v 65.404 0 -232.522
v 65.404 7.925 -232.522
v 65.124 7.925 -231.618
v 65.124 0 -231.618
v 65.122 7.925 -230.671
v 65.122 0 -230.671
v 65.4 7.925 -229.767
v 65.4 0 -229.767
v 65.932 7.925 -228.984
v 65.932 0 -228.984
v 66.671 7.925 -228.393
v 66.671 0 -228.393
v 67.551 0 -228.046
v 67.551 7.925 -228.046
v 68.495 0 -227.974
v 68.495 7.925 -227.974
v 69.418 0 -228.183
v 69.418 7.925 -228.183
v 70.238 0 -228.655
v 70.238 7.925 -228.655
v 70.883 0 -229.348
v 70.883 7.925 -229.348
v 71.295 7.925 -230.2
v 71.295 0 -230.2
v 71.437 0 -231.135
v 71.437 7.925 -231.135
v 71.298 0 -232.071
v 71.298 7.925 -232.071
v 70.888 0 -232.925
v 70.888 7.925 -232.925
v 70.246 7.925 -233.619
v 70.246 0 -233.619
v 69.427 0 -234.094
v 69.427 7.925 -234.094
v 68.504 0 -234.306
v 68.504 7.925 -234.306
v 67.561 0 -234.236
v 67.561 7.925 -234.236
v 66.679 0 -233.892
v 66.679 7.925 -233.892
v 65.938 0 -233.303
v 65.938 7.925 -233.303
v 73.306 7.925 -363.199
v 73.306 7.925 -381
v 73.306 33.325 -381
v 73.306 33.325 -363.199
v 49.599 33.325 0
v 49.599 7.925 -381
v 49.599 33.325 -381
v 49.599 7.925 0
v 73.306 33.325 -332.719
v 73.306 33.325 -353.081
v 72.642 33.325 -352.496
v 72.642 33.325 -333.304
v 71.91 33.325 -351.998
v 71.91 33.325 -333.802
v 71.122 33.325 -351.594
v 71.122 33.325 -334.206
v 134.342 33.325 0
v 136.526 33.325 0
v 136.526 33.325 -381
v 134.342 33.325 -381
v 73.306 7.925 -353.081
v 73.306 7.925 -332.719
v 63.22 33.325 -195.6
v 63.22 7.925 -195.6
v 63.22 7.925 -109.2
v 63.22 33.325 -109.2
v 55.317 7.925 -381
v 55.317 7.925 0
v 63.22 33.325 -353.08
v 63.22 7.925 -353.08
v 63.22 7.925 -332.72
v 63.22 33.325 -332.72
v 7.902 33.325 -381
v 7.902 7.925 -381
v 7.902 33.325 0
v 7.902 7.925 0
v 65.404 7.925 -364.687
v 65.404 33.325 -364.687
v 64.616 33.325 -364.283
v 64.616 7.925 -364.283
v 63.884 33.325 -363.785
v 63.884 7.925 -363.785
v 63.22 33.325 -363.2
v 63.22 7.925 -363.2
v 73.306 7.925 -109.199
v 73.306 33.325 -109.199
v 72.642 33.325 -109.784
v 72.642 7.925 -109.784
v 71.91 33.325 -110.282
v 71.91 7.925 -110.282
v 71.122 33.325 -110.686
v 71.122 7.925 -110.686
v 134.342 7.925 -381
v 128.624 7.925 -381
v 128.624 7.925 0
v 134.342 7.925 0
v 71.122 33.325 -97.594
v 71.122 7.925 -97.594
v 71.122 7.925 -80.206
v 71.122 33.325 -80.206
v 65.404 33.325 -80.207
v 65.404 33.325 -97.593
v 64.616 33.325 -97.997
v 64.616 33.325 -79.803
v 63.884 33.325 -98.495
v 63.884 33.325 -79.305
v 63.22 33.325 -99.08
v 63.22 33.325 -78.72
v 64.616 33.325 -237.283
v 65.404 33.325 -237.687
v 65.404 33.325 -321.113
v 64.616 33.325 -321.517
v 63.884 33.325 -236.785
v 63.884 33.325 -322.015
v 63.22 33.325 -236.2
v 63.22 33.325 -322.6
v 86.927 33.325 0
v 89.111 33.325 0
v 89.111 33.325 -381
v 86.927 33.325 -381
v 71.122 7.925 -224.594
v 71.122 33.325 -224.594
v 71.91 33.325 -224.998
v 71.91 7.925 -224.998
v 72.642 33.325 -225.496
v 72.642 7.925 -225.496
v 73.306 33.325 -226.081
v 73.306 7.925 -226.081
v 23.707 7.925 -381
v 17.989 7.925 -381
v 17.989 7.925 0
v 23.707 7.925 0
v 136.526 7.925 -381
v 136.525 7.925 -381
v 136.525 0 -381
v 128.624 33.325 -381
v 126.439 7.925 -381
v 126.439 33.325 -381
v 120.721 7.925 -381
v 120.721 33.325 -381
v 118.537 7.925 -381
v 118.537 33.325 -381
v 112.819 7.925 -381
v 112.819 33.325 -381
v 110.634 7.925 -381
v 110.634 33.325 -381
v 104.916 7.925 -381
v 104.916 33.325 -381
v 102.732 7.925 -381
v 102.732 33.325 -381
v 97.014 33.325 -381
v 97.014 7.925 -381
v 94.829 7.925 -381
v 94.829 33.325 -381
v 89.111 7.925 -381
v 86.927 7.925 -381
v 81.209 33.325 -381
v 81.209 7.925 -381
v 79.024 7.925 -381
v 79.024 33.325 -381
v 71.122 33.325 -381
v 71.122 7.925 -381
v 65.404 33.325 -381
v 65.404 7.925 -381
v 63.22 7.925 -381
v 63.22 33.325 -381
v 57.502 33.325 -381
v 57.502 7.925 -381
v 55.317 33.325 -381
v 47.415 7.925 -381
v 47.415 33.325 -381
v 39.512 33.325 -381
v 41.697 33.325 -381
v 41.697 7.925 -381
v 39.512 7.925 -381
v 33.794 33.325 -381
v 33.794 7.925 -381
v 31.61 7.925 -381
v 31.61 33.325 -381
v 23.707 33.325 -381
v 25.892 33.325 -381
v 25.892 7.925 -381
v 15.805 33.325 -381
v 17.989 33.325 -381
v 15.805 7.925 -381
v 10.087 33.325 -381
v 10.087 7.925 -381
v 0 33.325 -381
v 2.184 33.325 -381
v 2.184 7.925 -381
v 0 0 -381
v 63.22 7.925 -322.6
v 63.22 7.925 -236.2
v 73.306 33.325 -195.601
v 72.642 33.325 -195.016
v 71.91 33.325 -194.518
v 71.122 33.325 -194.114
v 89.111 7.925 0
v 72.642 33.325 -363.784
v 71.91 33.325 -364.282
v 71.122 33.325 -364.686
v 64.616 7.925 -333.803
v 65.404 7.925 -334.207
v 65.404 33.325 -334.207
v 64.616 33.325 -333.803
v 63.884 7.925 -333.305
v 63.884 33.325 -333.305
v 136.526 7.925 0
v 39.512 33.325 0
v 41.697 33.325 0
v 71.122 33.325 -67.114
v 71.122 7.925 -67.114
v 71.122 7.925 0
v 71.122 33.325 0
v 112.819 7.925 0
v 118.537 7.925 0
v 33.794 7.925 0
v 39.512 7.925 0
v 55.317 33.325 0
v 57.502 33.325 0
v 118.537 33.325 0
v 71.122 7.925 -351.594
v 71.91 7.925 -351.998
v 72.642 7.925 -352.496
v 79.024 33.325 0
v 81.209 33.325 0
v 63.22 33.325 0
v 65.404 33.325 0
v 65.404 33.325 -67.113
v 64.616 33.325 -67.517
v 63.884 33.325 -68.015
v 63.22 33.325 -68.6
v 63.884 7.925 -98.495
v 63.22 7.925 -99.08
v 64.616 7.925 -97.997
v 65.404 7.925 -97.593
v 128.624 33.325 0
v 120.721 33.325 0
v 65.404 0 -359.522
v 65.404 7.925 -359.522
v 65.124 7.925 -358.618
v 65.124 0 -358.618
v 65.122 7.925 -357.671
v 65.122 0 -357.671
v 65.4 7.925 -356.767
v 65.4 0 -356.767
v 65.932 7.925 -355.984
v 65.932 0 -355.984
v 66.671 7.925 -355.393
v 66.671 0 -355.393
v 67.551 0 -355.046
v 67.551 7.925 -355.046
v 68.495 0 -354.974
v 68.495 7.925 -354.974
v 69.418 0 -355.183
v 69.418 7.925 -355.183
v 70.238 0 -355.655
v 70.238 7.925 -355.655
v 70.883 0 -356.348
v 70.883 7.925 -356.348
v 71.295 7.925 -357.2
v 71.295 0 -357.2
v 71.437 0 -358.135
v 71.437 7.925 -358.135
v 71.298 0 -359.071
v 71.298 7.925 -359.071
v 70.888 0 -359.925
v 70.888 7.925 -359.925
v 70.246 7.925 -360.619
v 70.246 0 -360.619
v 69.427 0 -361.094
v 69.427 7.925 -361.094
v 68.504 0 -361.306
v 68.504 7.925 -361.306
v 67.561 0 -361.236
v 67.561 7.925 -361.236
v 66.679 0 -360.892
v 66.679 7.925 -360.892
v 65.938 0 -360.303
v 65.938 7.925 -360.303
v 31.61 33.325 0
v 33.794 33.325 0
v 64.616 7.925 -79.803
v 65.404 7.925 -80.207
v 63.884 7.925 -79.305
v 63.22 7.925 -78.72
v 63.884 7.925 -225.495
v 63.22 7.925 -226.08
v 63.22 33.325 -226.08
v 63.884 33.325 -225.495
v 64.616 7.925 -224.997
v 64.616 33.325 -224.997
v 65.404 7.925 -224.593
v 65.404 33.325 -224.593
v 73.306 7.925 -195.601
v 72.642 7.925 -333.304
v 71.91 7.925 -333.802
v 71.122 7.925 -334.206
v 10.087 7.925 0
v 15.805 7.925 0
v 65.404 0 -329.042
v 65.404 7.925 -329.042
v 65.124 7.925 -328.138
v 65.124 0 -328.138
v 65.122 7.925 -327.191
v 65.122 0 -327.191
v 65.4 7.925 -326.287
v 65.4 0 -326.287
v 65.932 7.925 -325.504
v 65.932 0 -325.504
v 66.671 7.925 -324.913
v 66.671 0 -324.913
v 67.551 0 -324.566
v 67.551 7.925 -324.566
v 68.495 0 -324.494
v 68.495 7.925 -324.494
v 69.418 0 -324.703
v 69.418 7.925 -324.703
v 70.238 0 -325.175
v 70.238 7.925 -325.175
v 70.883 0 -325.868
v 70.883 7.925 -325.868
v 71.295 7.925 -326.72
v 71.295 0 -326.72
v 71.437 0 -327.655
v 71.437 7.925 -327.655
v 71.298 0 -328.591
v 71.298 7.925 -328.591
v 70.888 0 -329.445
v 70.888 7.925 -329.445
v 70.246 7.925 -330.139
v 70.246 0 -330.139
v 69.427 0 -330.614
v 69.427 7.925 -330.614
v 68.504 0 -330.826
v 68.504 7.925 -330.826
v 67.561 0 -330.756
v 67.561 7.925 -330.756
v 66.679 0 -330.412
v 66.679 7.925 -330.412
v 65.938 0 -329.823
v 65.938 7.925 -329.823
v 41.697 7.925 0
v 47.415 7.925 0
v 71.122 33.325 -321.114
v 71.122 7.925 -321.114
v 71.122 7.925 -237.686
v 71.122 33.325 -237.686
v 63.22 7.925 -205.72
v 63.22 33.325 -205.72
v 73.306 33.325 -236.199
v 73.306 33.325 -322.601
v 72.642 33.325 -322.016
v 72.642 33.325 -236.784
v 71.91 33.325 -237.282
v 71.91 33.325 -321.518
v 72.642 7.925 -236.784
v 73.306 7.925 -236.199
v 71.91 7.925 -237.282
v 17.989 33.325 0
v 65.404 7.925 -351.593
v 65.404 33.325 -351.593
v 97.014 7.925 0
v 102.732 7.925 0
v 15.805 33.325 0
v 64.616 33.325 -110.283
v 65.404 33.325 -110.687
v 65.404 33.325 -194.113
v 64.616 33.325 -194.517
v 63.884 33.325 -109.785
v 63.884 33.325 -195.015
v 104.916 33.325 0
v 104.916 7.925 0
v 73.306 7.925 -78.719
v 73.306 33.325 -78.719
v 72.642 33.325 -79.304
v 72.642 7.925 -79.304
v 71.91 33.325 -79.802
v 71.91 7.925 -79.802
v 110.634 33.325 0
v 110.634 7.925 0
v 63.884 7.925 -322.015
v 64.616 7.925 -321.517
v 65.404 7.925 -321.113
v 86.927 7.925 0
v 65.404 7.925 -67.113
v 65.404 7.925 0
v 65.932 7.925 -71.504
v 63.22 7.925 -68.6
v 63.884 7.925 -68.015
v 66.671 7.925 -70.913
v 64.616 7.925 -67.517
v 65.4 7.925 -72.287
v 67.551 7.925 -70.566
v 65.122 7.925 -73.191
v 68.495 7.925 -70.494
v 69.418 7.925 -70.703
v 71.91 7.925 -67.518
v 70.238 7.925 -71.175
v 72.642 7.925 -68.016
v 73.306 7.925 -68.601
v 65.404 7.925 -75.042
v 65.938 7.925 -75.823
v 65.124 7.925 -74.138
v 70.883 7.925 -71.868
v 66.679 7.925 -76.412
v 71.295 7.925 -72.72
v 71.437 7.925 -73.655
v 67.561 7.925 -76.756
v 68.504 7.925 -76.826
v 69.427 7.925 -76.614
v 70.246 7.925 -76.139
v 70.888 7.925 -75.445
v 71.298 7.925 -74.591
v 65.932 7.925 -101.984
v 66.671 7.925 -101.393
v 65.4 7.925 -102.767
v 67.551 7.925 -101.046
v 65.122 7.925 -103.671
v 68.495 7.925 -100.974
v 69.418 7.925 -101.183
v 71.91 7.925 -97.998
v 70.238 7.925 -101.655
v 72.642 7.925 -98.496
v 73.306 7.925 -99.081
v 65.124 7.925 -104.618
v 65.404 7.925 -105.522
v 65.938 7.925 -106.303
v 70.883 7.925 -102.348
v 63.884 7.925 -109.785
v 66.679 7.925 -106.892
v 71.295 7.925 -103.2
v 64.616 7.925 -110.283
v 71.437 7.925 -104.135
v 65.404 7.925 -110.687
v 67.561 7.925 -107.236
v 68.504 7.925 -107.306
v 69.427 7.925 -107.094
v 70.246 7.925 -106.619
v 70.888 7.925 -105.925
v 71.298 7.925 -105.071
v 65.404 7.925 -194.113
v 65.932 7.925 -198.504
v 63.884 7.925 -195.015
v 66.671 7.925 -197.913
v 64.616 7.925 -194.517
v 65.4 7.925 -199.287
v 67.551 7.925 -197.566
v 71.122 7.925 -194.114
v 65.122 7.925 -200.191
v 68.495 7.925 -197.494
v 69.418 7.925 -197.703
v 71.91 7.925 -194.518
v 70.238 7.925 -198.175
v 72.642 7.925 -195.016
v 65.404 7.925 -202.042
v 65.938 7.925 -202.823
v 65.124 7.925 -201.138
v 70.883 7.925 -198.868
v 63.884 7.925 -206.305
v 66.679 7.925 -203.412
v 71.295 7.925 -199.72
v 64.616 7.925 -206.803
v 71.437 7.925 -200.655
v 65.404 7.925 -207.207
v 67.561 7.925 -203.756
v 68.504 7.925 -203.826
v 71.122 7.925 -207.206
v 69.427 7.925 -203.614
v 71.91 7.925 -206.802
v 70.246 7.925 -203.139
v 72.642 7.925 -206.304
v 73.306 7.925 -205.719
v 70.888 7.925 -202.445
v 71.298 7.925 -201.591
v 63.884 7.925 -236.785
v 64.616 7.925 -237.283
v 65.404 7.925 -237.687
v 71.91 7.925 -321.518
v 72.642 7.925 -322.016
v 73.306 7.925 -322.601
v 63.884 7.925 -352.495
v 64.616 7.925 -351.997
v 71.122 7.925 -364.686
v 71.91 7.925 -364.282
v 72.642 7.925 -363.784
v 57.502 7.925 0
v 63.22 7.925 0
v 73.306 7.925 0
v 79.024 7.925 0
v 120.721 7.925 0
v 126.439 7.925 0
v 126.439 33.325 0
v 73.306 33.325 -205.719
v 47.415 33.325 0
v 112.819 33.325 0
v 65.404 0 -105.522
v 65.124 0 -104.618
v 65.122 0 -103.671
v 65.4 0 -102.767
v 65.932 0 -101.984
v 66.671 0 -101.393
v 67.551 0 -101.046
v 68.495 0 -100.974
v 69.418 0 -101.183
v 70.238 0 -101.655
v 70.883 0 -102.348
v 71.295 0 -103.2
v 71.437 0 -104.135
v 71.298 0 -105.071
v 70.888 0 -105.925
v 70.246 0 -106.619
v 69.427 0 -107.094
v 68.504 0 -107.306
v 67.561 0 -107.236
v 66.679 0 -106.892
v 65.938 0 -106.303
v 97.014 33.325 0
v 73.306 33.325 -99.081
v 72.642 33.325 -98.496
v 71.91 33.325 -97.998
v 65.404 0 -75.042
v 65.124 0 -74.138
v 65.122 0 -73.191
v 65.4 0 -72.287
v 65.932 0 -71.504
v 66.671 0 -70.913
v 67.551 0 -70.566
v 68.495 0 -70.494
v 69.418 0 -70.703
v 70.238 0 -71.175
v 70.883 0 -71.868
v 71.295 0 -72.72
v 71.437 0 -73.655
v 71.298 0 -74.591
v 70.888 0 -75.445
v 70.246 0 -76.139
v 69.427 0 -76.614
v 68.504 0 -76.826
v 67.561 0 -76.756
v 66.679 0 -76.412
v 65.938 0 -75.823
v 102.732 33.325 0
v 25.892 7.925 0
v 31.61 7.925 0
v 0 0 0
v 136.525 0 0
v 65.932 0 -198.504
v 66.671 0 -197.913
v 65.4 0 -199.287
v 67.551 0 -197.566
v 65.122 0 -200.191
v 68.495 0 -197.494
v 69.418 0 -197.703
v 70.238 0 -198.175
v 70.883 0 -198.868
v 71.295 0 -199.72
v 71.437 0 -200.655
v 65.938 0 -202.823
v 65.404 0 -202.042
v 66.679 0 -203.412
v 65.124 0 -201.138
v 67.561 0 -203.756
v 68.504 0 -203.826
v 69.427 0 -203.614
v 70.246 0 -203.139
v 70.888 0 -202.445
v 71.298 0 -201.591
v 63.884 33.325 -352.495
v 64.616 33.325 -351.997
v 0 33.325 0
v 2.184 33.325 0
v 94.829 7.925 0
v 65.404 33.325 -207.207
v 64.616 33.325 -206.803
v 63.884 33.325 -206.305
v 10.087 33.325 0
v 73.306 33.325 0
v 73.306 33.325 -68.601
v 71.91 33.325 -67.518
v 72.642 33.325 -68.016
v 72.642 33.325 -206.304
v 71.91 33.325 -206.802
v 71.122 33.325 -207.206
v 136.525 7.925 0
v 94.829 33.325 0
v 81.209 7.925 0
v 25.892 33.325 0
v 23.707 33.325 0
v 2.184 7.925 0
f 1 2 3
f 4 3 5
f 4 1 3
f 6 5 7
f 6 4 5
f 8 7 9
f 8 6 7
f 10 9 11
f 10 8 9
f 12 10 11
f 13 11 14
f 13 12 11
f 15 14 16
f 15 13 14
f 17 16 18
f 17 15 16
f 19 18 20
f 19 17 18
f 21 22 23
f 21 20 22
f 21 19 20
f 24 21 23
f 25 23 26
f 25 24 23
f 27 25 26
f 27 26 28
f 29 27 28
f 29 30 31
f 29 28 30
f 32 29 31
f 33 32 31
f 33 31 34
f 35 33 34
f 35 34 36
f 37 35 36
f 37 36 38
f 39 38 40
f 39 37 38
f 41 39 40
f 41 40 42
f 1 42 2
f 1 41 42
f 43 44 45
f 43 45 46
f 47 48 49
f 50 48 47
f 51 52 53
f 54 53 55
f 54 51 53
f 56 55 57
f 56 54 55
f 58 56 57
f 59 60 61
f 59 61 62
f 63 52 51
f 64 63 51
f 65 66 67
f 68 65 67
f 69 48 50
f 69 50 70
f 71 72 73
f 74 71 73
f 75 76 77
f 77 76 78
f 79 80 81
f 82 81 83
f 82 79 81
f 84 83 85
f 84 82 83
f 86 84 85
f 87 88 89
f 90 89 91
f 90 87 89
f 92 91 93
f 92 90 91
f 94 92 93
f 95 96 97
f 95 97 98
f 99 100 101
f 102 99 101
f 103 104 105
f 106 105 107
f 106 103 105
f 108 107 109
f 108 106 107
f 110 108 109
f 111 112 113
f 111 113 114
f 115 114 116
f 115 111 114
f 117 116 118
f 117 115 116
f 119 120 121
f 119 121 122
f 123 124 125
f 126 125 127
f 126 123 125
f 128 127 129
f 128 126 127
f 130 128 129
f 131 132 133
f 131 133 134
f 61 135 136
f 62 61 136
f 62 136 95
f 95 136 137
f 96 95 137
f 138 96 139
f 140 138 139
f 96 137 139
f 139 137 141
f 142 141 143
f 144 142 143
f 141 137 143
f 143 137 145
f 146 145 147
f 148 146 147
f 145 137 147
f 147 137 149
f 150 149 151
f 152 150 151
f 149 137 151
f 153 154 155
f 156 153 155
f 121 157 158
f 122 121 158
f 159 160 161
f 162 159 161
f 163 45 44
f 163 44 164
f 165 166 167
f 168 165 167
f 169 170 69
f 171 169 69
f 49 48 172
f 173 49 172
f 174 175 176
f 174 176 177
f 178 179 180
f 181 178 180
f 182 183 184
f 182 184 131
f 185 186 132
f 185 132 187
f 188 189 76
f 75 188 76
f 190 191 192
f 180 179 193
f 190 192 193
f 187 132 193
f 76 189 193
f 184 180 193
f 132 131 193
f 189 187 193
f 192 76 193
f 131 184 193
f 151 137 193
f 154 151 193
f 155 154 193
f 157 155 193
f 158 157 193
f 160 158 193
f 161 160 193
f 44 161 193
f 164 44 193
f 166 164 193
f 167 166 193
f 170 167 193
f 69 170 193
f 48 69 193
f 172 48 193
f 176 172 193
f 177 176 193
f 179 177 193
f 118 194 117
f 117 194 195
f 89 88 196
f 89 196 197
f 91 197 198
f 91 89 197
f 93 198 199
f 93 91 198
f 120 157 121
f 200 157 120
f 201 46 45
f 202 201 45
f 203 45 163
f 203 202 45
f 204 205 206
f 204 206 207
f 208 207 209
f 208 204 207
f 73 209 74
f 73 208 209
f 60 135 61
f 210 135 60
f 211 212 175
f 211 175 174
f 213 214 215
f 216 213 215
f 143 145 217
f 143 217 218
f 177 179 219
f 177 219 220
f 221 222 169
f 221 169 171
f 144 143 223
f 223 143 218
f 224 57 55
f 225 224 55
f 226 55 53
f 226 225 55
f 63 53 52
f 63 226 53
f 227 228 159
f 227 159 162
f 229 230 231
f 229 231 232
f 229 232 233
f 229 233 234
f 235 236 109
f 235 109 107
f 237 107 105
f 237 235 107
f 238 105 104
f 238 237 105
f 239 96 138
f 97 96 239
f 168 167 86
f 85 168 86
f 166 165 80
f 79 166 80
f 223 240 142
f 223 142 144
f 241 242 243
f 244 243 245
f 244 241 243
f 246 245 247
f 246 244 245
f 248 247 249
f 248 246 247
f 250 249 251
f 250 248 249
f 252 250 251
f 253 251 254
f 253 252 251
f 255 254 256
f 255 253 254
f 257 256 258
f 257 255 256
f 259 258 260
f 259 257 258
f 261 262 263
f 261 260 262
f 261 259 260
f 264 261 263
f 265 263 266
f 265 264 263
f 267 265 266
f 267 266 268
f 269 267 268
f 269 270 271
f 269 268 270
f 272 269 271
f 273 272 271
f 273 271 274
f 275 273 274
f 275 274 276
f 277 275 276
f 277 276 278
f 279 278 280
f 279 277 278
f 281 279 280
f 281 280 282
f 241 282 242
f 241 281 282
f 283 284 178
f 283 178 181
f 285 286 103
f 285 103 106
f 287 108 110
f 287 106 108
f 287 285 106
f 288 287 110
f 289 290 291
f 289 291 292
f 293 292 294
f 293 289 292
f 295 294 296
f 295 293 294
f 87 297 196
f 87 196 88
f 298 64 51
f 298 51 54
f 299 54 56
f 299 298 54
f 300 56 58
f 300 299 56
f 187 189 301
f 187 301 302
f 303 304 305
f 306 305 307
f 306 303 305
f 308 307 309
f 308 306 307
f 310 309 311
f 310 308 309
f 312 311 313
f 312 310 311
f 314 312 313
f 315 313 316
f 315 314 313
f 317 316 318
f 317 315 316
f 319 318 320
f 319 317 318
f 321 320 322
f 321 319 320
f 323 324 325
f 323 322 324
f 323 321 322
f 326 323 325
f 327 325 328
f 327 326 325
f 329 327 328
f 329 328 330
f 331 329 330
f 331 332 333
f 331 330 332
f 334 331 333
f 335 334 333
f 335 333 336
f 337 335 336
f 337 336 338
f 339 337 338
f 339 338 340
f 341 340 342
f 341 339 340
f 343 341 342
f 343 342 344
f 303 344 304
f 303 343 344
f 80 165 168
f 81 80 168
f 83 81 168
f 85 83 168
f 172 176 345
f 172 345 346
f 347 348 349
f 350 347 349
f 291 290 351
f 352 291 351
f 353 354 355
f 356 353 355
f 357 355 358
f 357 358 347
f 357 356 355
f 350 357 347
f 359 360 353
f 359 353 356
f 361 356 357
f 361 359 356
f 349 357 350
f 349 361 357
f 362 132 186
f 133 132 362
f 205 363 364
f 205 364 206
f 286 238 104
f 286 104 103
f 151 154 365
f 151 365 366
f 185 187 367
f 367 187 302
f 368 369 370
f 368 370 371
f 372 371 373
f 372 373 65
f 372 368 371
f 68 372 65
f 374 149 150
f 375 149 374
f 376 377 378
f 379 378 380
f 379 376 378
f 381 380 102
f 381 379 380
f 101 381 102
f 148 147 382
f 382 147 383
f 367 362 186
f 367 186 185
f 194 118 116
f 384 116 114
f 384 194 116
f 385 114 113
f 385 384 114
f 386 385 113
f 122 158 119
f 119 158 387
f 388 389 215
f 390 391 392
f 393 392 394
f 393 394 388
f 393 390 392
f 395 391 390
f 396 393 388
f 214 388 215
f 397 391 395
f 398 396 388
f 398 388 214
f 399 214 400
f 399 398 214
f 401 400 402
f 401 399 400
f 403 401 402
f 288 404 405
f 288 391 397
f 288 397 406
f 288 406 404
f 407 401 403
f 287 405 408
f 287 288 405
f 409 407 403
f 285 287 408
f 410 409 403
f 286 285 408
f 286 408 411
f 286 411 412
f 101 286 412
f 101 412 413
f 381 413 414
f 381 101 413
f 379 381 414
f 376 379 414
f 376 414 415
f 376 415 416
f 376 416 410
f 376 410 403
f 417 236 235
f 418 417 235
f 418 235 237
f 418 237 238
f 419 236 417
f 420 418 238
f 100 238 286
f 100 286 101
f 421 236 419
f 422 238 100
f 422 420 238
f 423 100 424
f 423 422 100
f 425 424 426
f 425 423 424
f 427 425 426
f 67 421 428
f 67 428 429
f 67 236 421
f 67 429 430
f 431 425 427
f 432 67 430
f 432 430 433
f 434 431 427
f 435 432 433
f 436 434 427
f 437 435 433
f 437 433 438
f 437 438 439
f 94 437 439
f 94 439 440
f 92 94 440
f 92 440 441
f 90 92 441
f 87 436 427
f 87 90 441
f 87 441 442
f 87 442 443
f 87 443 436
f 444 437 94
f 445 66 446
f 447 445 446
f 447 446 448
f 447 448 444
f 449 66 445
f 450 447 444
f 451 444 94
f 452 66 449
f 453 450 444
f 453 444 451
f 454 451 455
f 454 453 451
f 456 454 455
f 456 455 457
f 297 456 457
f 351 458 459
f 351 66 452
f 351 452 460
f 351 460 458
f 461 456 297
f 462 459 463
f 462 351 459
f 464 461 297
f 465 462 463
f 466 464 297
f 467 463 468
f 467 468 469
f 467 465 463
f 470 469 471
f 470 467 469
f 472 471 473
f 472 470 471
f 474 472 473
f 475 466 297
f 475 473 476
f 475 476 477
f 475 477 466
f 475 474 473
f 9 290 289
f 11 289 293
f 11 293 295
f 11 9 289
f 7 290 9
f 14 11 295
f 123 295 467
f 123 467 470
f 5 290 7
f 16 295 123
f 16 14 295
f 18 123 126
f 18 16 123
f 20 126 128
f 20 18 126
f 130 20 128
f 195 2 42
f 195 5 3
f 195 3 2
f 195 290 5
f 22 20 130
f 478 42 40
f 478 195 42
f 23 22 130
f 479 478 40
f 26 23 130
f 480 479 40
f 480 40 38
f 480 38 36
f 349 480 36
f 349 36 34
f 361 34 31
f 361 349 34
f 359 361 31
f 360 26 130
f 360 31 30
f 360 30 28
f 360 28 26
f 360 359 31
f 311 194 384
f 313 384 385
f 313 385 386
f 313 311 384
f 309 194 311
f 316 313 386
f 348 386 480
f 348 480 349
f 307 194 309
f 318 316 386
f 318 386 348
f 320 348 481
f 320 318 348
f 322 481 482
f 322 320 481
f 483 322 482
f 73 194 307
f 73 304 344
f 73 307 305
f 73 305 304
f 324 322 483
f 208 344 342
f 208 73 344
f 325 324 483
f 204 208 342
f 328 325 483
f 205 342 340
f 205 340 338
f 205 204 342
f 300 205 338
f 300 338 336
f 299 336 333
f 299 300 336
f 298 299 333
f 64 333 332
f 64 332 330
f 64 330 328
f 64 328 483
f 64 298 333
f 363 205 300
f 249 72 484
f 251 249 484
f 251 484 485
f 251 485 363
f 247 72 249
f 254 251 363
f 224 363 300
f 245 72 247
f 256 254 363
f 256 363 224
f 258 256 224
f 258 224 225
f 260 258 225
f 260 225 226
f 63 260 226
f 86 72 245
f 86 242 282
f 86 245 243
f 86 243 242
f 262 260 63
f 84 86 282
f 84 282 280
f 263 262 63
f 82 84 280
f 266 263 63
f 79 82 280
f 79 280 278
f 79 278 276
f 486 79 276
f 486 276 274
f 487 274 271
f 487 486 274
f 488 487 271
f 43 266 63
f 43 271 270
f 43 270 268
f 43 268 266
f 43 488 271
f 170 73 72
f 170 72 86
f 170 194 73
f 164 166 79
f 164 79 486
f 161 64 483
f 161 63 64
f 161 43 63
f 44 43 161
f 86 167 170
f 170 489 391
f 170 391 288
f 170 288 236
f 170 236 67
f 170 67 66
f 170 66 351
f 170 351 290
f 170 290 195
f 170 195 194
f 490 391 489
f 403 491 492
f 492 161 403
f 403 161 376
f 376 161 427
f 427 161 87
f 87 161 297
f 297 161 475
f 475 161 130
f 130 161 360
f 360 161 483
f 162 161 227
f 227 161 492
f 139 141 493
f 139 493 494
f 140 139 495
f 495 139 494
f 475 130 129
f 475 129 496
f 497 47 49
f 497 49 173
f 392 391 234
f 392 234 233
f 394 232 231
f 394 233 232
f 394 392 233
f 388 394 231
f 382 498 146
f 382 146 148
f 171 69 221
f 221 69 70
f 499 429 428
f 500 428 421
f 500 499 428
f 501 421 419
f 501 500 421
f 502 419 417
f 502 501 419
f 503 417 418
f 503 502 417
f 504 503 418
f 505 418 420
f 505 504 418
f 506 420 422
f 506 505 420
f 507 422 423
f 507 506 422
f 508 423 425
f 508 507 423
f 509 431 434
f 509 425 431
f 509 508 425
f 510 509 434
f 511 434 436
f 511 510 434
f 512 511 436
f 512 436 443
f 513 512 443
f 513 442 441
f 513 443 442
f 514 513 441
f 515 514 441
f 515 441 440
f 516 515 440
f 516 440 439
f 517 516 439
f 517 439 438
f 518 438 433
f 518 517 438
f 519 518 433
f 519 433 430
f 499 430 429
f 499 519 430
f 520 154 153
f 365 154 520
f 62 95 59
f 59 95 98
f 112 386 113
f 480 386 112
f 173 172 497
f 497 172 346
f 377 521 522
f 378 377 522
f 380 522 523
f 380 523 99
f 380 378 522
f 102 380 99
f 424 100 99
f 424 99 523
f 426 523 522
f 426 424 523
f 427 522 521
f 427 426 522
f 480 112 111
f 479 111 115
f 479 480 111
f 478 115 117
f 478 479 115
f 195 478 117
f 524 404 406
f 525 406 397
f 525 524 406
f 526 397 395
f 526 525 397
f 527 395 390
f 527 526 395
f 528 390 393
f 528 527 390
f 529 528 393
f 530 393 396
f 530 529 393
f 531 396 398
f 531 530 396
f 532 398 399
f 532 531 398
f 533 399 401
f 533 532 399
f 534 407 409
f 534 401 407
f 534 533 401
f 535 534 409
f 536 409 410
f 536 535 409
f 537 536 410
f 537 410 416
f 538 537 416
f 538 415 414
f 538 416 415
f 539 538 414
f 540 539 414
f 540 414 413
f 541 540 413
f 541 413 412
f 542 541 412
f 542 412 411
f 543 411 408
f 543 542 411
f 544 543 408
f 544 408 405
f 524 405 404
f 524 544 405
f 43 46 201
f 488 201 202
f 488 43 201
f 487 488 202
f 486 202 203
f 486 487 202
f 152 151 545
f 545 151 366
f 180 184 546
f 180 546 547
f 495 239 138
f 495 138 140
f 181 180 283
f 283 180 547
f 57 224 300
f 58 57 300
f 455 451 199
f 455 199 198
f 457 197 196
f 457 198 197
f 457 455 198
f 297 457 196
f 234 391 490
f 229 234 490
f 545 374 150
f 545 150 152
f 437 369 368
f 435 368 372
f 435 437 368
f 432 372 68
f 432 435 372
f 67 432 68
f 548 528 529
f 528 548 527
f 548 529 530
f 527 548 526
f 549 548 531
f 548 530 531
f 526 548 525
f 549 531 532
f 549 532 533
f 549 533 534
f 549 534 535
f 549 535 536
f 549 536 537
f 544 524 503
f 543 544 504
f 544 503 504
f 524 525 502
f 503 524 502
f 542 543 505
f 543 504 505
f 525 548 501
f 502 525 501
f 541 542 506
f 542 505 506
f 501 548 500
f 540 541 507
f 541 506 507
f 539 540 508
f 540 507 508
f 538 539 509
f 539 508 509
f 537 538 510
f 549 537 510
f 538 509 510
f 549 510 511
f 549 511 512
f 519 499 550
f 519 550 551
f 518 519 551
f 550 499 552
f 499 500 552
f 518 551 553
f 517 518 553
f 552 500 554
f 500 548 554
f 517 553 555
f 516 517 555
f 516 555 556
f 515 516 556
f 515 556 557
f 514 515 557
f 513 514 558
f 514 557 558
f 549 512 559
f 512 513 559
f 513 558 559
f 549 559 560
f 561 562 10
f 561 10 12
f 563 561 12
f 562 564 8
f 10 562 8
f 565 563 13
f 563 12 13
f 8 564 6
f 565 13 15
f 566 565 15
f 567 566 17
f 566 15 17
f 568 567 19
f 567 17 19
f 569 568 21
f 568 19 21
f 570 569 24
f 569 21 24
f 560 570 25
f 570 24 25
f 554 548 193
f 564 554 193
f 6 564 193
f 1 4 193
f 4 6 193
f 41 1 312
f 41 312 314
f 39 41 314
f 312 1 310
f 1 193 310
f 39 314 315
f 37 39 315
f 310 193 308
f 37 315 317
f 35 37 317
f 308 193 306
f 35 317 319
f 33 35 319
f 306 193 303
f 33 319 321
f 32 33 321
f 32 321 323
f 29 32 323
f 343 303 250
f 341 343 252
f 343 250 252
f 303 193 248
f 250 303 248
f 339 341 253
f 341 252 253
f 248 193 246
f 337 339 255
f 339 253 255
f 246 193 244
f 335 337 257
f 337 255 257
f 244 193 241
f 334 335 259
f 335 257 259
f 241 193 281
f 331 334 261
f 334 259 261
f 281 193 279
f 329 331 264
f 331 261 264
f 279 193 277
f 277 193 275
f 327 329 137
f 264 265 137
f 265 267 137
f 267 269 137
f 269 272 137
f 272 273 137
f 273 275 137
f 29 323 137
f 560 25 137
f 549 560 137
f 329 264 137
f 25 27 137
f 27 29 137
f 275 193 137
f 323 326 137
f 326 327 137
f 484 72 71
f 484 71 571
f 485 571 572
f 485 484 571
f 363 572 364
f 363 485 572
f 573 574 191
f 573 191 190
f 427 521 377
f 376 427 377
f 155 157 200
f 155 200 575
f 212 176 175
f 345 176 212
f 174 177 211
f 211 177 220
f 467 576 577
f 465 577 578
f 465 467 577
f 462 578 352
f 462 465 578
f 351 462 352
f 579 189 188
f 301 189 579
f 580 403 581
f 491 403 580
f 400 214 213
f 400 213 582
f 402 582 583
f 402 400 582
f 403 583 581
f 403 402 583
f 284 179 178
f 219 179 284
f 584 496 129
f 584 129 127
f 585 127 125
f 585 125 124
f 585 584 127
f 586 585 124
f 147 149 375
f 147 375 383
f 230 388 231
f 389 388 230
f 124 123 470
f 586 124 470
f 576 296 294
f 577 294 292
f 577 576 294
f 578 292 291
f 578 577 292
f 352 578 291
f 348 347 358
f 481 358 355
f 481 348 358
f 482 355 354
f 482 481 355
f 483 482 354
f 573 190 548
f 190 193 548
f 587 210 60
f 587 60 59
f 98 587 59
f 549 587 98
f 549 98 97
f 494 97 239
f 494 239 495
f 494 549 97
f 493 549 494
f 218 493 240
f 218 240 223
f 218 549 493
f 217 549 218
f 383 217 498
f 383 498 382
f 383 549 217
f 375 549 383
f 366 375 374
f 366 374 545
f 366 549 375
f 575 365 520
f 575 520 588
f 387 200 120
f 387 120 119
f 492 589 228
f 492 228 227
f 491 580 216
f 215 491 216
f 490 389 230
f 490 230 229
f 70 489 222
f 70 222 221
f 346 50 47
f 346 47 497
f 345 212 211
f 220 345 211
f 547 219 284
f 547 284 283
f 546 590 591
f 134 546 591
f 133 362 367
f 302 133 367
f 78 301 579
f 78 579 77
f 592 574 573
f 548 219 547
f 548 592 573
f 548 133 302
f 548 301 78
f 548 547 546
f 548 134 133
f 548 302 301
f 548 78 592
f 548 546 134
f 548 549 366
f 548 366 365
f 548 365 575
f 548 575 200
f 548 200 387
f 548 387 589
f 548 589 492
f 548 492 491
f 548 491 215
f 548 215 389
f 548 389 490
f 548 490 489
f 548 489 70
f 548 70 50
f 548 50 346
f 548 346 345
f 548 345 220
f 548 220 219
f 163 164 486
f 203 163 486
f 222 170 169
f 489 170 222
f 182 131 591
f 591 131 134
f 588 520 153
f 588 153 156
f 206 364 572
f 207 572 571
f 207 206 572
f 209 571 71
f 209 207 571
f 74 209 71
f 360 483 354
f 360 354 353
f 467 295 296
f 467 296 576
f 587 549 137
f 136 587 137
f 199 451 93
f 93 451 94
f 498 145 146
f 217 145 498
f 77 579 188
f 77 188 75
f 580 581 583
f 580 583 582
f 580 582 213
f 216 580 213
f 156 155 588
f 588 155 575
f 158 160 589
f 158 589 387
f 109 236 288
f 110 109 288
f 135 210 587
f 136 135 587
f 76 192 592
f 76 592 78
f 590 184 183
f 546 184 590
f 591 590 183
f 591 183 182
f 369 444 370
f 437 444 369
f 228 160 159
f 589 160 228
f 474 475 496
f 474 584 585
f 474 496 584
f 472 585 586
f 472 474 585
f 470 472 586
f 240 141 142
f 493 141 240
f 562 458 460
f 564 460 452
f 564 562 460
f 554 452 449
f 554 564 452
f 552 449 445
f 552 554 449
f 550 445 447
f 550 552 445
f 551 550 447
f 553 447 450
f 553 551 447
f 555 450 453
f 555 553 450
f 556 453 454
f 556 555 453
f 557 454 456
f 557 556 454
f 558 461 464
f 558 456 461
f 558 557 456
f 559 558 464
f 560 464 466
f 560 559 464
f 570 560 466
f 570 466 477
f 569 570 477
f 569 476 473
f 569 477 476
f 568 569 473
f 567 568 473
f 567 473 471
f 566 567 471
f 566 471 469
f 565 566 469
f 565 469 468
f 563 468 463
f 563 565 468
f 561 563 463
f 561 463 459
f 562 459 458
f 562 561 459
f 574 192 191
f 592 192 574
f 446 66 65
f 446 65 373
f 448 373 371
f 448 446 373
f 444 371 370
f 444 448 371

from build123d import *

# Parameters (mm, degrees)
SKETCH1_W          = 136.525
SKETCH1_H          = 381
EXTRUDE1_DEPTH     = 7.9248
SKETCH4_W          = 2.1844
SKETCH4_H          = 381
EXTRUDE2_DEPTH     = 25.4
LPATTERN1_COUNT    = 18
LPATTERN1_PITCH    = 7.902448
SKETCH6_R          = 3.175
CUT_EXTRUDE2_DEPTH = 10.16
SKETCH7_R          = 7.14375
CUT_EXTRUDE3_DEPTH = 406.518819594


with BuildPart() as part:
    # Sketch1 → Extrude1 (new body)
    with BuildSketch(Plane(origin=(0, 0, 0), x_dir=(1, 0, 0), z_dir=(0, 1, 0))):
        with Locations((68.2625, 190.5)):
            Rectangle(SKETCH1_W, SKETCH1_H)
    extrude(amount=EXTRUDE1_DEPTH)

    # Sketch4 → Extrude2 (add)
    with BuildSketch(Plane(origin=(0, 7.9248, 0), x_dir=(-1, 0, 0), z_dir=(0, 1, 0))):
        with Locations((-1.0922, -190.5)):
            Rectangle(SKETCH4_W, SKETCH4_H)
    extrude2 = extrude(amount=EXTRUDE2_DEPTH)

    # LPattern1: Extrude2 ×18
    with Locations(*[(i * LPATTERN1_PITCH, 0, 0) for i in range(1, LPATTERN1_COUNT)]):
        add(extrude2)

    # Sketch6 → Cut-Extrude2 (cut)
    with BuildSketch(Plane(origin=(0, 0, 0), x_dir=(1, 0, 0), z_dir=(0, 1, 0))):
        with Locations(Location((68.2625, 358.14, 0), (0, 0, 154.200161739))):
            Circle(SKETCH6_R)
        with Locations(Location((68.2625, 327.66, 0), (0, 0, 154.200161739))):
            Circle(SKETCH6_R)
        with Locations(Location((68.2625, 200.66, 0), (0, 0, 154.200161739))):
            Circle(SKETCH6_R)
        with Locations(Location((68.2625, 231.14, 0), (0, 0, 154.200161739))):
            Circle(SKETCH6_R)
        with Locations(Location((68.2625, 73.66, 0), (0, 0, 154.200161739))):
            Circle(SKETCH6_R)
        with Locations(Location((68.2625, 104.14, 0), (0, 0, 154.200161739))):
            Circle(SKETCH6_R)
    extrude(amount=CUT_EXTRUDE2_DEPTH, mode=Mode.SUBTRACT)

    # Sketch7 → Cut-Extrude3 (cut, through all)
    with BuildSketch(Plane(origin=(0, 7.9248, 0), x_dir=(-1, 0, 0), z_dir=(0, 1, 0))):
        with Locations((-68.2625, -358.14)):
            Circle(SKETCH7_R)
        with Locations((-68.2625, -327.66)):
            Circle(SKETCH7_R)
        with Locations((-68.2625, -231.14)):
            Circle(SKETCH7_R)
        with Locations((-68.2625, -200.66)):
            Circle(SKETCH7_R)
        with Locations((-68.2625, -73.66)):
            Circle(SKETCH7_R)
        with Locations((-68.2625, -104.14)):
            Circle(SKETCH7_R)
    extrude(amount=CUT_EXTRUDE3_DEPTH, mode=Mode.SUBTRACT)


solid = part.part
